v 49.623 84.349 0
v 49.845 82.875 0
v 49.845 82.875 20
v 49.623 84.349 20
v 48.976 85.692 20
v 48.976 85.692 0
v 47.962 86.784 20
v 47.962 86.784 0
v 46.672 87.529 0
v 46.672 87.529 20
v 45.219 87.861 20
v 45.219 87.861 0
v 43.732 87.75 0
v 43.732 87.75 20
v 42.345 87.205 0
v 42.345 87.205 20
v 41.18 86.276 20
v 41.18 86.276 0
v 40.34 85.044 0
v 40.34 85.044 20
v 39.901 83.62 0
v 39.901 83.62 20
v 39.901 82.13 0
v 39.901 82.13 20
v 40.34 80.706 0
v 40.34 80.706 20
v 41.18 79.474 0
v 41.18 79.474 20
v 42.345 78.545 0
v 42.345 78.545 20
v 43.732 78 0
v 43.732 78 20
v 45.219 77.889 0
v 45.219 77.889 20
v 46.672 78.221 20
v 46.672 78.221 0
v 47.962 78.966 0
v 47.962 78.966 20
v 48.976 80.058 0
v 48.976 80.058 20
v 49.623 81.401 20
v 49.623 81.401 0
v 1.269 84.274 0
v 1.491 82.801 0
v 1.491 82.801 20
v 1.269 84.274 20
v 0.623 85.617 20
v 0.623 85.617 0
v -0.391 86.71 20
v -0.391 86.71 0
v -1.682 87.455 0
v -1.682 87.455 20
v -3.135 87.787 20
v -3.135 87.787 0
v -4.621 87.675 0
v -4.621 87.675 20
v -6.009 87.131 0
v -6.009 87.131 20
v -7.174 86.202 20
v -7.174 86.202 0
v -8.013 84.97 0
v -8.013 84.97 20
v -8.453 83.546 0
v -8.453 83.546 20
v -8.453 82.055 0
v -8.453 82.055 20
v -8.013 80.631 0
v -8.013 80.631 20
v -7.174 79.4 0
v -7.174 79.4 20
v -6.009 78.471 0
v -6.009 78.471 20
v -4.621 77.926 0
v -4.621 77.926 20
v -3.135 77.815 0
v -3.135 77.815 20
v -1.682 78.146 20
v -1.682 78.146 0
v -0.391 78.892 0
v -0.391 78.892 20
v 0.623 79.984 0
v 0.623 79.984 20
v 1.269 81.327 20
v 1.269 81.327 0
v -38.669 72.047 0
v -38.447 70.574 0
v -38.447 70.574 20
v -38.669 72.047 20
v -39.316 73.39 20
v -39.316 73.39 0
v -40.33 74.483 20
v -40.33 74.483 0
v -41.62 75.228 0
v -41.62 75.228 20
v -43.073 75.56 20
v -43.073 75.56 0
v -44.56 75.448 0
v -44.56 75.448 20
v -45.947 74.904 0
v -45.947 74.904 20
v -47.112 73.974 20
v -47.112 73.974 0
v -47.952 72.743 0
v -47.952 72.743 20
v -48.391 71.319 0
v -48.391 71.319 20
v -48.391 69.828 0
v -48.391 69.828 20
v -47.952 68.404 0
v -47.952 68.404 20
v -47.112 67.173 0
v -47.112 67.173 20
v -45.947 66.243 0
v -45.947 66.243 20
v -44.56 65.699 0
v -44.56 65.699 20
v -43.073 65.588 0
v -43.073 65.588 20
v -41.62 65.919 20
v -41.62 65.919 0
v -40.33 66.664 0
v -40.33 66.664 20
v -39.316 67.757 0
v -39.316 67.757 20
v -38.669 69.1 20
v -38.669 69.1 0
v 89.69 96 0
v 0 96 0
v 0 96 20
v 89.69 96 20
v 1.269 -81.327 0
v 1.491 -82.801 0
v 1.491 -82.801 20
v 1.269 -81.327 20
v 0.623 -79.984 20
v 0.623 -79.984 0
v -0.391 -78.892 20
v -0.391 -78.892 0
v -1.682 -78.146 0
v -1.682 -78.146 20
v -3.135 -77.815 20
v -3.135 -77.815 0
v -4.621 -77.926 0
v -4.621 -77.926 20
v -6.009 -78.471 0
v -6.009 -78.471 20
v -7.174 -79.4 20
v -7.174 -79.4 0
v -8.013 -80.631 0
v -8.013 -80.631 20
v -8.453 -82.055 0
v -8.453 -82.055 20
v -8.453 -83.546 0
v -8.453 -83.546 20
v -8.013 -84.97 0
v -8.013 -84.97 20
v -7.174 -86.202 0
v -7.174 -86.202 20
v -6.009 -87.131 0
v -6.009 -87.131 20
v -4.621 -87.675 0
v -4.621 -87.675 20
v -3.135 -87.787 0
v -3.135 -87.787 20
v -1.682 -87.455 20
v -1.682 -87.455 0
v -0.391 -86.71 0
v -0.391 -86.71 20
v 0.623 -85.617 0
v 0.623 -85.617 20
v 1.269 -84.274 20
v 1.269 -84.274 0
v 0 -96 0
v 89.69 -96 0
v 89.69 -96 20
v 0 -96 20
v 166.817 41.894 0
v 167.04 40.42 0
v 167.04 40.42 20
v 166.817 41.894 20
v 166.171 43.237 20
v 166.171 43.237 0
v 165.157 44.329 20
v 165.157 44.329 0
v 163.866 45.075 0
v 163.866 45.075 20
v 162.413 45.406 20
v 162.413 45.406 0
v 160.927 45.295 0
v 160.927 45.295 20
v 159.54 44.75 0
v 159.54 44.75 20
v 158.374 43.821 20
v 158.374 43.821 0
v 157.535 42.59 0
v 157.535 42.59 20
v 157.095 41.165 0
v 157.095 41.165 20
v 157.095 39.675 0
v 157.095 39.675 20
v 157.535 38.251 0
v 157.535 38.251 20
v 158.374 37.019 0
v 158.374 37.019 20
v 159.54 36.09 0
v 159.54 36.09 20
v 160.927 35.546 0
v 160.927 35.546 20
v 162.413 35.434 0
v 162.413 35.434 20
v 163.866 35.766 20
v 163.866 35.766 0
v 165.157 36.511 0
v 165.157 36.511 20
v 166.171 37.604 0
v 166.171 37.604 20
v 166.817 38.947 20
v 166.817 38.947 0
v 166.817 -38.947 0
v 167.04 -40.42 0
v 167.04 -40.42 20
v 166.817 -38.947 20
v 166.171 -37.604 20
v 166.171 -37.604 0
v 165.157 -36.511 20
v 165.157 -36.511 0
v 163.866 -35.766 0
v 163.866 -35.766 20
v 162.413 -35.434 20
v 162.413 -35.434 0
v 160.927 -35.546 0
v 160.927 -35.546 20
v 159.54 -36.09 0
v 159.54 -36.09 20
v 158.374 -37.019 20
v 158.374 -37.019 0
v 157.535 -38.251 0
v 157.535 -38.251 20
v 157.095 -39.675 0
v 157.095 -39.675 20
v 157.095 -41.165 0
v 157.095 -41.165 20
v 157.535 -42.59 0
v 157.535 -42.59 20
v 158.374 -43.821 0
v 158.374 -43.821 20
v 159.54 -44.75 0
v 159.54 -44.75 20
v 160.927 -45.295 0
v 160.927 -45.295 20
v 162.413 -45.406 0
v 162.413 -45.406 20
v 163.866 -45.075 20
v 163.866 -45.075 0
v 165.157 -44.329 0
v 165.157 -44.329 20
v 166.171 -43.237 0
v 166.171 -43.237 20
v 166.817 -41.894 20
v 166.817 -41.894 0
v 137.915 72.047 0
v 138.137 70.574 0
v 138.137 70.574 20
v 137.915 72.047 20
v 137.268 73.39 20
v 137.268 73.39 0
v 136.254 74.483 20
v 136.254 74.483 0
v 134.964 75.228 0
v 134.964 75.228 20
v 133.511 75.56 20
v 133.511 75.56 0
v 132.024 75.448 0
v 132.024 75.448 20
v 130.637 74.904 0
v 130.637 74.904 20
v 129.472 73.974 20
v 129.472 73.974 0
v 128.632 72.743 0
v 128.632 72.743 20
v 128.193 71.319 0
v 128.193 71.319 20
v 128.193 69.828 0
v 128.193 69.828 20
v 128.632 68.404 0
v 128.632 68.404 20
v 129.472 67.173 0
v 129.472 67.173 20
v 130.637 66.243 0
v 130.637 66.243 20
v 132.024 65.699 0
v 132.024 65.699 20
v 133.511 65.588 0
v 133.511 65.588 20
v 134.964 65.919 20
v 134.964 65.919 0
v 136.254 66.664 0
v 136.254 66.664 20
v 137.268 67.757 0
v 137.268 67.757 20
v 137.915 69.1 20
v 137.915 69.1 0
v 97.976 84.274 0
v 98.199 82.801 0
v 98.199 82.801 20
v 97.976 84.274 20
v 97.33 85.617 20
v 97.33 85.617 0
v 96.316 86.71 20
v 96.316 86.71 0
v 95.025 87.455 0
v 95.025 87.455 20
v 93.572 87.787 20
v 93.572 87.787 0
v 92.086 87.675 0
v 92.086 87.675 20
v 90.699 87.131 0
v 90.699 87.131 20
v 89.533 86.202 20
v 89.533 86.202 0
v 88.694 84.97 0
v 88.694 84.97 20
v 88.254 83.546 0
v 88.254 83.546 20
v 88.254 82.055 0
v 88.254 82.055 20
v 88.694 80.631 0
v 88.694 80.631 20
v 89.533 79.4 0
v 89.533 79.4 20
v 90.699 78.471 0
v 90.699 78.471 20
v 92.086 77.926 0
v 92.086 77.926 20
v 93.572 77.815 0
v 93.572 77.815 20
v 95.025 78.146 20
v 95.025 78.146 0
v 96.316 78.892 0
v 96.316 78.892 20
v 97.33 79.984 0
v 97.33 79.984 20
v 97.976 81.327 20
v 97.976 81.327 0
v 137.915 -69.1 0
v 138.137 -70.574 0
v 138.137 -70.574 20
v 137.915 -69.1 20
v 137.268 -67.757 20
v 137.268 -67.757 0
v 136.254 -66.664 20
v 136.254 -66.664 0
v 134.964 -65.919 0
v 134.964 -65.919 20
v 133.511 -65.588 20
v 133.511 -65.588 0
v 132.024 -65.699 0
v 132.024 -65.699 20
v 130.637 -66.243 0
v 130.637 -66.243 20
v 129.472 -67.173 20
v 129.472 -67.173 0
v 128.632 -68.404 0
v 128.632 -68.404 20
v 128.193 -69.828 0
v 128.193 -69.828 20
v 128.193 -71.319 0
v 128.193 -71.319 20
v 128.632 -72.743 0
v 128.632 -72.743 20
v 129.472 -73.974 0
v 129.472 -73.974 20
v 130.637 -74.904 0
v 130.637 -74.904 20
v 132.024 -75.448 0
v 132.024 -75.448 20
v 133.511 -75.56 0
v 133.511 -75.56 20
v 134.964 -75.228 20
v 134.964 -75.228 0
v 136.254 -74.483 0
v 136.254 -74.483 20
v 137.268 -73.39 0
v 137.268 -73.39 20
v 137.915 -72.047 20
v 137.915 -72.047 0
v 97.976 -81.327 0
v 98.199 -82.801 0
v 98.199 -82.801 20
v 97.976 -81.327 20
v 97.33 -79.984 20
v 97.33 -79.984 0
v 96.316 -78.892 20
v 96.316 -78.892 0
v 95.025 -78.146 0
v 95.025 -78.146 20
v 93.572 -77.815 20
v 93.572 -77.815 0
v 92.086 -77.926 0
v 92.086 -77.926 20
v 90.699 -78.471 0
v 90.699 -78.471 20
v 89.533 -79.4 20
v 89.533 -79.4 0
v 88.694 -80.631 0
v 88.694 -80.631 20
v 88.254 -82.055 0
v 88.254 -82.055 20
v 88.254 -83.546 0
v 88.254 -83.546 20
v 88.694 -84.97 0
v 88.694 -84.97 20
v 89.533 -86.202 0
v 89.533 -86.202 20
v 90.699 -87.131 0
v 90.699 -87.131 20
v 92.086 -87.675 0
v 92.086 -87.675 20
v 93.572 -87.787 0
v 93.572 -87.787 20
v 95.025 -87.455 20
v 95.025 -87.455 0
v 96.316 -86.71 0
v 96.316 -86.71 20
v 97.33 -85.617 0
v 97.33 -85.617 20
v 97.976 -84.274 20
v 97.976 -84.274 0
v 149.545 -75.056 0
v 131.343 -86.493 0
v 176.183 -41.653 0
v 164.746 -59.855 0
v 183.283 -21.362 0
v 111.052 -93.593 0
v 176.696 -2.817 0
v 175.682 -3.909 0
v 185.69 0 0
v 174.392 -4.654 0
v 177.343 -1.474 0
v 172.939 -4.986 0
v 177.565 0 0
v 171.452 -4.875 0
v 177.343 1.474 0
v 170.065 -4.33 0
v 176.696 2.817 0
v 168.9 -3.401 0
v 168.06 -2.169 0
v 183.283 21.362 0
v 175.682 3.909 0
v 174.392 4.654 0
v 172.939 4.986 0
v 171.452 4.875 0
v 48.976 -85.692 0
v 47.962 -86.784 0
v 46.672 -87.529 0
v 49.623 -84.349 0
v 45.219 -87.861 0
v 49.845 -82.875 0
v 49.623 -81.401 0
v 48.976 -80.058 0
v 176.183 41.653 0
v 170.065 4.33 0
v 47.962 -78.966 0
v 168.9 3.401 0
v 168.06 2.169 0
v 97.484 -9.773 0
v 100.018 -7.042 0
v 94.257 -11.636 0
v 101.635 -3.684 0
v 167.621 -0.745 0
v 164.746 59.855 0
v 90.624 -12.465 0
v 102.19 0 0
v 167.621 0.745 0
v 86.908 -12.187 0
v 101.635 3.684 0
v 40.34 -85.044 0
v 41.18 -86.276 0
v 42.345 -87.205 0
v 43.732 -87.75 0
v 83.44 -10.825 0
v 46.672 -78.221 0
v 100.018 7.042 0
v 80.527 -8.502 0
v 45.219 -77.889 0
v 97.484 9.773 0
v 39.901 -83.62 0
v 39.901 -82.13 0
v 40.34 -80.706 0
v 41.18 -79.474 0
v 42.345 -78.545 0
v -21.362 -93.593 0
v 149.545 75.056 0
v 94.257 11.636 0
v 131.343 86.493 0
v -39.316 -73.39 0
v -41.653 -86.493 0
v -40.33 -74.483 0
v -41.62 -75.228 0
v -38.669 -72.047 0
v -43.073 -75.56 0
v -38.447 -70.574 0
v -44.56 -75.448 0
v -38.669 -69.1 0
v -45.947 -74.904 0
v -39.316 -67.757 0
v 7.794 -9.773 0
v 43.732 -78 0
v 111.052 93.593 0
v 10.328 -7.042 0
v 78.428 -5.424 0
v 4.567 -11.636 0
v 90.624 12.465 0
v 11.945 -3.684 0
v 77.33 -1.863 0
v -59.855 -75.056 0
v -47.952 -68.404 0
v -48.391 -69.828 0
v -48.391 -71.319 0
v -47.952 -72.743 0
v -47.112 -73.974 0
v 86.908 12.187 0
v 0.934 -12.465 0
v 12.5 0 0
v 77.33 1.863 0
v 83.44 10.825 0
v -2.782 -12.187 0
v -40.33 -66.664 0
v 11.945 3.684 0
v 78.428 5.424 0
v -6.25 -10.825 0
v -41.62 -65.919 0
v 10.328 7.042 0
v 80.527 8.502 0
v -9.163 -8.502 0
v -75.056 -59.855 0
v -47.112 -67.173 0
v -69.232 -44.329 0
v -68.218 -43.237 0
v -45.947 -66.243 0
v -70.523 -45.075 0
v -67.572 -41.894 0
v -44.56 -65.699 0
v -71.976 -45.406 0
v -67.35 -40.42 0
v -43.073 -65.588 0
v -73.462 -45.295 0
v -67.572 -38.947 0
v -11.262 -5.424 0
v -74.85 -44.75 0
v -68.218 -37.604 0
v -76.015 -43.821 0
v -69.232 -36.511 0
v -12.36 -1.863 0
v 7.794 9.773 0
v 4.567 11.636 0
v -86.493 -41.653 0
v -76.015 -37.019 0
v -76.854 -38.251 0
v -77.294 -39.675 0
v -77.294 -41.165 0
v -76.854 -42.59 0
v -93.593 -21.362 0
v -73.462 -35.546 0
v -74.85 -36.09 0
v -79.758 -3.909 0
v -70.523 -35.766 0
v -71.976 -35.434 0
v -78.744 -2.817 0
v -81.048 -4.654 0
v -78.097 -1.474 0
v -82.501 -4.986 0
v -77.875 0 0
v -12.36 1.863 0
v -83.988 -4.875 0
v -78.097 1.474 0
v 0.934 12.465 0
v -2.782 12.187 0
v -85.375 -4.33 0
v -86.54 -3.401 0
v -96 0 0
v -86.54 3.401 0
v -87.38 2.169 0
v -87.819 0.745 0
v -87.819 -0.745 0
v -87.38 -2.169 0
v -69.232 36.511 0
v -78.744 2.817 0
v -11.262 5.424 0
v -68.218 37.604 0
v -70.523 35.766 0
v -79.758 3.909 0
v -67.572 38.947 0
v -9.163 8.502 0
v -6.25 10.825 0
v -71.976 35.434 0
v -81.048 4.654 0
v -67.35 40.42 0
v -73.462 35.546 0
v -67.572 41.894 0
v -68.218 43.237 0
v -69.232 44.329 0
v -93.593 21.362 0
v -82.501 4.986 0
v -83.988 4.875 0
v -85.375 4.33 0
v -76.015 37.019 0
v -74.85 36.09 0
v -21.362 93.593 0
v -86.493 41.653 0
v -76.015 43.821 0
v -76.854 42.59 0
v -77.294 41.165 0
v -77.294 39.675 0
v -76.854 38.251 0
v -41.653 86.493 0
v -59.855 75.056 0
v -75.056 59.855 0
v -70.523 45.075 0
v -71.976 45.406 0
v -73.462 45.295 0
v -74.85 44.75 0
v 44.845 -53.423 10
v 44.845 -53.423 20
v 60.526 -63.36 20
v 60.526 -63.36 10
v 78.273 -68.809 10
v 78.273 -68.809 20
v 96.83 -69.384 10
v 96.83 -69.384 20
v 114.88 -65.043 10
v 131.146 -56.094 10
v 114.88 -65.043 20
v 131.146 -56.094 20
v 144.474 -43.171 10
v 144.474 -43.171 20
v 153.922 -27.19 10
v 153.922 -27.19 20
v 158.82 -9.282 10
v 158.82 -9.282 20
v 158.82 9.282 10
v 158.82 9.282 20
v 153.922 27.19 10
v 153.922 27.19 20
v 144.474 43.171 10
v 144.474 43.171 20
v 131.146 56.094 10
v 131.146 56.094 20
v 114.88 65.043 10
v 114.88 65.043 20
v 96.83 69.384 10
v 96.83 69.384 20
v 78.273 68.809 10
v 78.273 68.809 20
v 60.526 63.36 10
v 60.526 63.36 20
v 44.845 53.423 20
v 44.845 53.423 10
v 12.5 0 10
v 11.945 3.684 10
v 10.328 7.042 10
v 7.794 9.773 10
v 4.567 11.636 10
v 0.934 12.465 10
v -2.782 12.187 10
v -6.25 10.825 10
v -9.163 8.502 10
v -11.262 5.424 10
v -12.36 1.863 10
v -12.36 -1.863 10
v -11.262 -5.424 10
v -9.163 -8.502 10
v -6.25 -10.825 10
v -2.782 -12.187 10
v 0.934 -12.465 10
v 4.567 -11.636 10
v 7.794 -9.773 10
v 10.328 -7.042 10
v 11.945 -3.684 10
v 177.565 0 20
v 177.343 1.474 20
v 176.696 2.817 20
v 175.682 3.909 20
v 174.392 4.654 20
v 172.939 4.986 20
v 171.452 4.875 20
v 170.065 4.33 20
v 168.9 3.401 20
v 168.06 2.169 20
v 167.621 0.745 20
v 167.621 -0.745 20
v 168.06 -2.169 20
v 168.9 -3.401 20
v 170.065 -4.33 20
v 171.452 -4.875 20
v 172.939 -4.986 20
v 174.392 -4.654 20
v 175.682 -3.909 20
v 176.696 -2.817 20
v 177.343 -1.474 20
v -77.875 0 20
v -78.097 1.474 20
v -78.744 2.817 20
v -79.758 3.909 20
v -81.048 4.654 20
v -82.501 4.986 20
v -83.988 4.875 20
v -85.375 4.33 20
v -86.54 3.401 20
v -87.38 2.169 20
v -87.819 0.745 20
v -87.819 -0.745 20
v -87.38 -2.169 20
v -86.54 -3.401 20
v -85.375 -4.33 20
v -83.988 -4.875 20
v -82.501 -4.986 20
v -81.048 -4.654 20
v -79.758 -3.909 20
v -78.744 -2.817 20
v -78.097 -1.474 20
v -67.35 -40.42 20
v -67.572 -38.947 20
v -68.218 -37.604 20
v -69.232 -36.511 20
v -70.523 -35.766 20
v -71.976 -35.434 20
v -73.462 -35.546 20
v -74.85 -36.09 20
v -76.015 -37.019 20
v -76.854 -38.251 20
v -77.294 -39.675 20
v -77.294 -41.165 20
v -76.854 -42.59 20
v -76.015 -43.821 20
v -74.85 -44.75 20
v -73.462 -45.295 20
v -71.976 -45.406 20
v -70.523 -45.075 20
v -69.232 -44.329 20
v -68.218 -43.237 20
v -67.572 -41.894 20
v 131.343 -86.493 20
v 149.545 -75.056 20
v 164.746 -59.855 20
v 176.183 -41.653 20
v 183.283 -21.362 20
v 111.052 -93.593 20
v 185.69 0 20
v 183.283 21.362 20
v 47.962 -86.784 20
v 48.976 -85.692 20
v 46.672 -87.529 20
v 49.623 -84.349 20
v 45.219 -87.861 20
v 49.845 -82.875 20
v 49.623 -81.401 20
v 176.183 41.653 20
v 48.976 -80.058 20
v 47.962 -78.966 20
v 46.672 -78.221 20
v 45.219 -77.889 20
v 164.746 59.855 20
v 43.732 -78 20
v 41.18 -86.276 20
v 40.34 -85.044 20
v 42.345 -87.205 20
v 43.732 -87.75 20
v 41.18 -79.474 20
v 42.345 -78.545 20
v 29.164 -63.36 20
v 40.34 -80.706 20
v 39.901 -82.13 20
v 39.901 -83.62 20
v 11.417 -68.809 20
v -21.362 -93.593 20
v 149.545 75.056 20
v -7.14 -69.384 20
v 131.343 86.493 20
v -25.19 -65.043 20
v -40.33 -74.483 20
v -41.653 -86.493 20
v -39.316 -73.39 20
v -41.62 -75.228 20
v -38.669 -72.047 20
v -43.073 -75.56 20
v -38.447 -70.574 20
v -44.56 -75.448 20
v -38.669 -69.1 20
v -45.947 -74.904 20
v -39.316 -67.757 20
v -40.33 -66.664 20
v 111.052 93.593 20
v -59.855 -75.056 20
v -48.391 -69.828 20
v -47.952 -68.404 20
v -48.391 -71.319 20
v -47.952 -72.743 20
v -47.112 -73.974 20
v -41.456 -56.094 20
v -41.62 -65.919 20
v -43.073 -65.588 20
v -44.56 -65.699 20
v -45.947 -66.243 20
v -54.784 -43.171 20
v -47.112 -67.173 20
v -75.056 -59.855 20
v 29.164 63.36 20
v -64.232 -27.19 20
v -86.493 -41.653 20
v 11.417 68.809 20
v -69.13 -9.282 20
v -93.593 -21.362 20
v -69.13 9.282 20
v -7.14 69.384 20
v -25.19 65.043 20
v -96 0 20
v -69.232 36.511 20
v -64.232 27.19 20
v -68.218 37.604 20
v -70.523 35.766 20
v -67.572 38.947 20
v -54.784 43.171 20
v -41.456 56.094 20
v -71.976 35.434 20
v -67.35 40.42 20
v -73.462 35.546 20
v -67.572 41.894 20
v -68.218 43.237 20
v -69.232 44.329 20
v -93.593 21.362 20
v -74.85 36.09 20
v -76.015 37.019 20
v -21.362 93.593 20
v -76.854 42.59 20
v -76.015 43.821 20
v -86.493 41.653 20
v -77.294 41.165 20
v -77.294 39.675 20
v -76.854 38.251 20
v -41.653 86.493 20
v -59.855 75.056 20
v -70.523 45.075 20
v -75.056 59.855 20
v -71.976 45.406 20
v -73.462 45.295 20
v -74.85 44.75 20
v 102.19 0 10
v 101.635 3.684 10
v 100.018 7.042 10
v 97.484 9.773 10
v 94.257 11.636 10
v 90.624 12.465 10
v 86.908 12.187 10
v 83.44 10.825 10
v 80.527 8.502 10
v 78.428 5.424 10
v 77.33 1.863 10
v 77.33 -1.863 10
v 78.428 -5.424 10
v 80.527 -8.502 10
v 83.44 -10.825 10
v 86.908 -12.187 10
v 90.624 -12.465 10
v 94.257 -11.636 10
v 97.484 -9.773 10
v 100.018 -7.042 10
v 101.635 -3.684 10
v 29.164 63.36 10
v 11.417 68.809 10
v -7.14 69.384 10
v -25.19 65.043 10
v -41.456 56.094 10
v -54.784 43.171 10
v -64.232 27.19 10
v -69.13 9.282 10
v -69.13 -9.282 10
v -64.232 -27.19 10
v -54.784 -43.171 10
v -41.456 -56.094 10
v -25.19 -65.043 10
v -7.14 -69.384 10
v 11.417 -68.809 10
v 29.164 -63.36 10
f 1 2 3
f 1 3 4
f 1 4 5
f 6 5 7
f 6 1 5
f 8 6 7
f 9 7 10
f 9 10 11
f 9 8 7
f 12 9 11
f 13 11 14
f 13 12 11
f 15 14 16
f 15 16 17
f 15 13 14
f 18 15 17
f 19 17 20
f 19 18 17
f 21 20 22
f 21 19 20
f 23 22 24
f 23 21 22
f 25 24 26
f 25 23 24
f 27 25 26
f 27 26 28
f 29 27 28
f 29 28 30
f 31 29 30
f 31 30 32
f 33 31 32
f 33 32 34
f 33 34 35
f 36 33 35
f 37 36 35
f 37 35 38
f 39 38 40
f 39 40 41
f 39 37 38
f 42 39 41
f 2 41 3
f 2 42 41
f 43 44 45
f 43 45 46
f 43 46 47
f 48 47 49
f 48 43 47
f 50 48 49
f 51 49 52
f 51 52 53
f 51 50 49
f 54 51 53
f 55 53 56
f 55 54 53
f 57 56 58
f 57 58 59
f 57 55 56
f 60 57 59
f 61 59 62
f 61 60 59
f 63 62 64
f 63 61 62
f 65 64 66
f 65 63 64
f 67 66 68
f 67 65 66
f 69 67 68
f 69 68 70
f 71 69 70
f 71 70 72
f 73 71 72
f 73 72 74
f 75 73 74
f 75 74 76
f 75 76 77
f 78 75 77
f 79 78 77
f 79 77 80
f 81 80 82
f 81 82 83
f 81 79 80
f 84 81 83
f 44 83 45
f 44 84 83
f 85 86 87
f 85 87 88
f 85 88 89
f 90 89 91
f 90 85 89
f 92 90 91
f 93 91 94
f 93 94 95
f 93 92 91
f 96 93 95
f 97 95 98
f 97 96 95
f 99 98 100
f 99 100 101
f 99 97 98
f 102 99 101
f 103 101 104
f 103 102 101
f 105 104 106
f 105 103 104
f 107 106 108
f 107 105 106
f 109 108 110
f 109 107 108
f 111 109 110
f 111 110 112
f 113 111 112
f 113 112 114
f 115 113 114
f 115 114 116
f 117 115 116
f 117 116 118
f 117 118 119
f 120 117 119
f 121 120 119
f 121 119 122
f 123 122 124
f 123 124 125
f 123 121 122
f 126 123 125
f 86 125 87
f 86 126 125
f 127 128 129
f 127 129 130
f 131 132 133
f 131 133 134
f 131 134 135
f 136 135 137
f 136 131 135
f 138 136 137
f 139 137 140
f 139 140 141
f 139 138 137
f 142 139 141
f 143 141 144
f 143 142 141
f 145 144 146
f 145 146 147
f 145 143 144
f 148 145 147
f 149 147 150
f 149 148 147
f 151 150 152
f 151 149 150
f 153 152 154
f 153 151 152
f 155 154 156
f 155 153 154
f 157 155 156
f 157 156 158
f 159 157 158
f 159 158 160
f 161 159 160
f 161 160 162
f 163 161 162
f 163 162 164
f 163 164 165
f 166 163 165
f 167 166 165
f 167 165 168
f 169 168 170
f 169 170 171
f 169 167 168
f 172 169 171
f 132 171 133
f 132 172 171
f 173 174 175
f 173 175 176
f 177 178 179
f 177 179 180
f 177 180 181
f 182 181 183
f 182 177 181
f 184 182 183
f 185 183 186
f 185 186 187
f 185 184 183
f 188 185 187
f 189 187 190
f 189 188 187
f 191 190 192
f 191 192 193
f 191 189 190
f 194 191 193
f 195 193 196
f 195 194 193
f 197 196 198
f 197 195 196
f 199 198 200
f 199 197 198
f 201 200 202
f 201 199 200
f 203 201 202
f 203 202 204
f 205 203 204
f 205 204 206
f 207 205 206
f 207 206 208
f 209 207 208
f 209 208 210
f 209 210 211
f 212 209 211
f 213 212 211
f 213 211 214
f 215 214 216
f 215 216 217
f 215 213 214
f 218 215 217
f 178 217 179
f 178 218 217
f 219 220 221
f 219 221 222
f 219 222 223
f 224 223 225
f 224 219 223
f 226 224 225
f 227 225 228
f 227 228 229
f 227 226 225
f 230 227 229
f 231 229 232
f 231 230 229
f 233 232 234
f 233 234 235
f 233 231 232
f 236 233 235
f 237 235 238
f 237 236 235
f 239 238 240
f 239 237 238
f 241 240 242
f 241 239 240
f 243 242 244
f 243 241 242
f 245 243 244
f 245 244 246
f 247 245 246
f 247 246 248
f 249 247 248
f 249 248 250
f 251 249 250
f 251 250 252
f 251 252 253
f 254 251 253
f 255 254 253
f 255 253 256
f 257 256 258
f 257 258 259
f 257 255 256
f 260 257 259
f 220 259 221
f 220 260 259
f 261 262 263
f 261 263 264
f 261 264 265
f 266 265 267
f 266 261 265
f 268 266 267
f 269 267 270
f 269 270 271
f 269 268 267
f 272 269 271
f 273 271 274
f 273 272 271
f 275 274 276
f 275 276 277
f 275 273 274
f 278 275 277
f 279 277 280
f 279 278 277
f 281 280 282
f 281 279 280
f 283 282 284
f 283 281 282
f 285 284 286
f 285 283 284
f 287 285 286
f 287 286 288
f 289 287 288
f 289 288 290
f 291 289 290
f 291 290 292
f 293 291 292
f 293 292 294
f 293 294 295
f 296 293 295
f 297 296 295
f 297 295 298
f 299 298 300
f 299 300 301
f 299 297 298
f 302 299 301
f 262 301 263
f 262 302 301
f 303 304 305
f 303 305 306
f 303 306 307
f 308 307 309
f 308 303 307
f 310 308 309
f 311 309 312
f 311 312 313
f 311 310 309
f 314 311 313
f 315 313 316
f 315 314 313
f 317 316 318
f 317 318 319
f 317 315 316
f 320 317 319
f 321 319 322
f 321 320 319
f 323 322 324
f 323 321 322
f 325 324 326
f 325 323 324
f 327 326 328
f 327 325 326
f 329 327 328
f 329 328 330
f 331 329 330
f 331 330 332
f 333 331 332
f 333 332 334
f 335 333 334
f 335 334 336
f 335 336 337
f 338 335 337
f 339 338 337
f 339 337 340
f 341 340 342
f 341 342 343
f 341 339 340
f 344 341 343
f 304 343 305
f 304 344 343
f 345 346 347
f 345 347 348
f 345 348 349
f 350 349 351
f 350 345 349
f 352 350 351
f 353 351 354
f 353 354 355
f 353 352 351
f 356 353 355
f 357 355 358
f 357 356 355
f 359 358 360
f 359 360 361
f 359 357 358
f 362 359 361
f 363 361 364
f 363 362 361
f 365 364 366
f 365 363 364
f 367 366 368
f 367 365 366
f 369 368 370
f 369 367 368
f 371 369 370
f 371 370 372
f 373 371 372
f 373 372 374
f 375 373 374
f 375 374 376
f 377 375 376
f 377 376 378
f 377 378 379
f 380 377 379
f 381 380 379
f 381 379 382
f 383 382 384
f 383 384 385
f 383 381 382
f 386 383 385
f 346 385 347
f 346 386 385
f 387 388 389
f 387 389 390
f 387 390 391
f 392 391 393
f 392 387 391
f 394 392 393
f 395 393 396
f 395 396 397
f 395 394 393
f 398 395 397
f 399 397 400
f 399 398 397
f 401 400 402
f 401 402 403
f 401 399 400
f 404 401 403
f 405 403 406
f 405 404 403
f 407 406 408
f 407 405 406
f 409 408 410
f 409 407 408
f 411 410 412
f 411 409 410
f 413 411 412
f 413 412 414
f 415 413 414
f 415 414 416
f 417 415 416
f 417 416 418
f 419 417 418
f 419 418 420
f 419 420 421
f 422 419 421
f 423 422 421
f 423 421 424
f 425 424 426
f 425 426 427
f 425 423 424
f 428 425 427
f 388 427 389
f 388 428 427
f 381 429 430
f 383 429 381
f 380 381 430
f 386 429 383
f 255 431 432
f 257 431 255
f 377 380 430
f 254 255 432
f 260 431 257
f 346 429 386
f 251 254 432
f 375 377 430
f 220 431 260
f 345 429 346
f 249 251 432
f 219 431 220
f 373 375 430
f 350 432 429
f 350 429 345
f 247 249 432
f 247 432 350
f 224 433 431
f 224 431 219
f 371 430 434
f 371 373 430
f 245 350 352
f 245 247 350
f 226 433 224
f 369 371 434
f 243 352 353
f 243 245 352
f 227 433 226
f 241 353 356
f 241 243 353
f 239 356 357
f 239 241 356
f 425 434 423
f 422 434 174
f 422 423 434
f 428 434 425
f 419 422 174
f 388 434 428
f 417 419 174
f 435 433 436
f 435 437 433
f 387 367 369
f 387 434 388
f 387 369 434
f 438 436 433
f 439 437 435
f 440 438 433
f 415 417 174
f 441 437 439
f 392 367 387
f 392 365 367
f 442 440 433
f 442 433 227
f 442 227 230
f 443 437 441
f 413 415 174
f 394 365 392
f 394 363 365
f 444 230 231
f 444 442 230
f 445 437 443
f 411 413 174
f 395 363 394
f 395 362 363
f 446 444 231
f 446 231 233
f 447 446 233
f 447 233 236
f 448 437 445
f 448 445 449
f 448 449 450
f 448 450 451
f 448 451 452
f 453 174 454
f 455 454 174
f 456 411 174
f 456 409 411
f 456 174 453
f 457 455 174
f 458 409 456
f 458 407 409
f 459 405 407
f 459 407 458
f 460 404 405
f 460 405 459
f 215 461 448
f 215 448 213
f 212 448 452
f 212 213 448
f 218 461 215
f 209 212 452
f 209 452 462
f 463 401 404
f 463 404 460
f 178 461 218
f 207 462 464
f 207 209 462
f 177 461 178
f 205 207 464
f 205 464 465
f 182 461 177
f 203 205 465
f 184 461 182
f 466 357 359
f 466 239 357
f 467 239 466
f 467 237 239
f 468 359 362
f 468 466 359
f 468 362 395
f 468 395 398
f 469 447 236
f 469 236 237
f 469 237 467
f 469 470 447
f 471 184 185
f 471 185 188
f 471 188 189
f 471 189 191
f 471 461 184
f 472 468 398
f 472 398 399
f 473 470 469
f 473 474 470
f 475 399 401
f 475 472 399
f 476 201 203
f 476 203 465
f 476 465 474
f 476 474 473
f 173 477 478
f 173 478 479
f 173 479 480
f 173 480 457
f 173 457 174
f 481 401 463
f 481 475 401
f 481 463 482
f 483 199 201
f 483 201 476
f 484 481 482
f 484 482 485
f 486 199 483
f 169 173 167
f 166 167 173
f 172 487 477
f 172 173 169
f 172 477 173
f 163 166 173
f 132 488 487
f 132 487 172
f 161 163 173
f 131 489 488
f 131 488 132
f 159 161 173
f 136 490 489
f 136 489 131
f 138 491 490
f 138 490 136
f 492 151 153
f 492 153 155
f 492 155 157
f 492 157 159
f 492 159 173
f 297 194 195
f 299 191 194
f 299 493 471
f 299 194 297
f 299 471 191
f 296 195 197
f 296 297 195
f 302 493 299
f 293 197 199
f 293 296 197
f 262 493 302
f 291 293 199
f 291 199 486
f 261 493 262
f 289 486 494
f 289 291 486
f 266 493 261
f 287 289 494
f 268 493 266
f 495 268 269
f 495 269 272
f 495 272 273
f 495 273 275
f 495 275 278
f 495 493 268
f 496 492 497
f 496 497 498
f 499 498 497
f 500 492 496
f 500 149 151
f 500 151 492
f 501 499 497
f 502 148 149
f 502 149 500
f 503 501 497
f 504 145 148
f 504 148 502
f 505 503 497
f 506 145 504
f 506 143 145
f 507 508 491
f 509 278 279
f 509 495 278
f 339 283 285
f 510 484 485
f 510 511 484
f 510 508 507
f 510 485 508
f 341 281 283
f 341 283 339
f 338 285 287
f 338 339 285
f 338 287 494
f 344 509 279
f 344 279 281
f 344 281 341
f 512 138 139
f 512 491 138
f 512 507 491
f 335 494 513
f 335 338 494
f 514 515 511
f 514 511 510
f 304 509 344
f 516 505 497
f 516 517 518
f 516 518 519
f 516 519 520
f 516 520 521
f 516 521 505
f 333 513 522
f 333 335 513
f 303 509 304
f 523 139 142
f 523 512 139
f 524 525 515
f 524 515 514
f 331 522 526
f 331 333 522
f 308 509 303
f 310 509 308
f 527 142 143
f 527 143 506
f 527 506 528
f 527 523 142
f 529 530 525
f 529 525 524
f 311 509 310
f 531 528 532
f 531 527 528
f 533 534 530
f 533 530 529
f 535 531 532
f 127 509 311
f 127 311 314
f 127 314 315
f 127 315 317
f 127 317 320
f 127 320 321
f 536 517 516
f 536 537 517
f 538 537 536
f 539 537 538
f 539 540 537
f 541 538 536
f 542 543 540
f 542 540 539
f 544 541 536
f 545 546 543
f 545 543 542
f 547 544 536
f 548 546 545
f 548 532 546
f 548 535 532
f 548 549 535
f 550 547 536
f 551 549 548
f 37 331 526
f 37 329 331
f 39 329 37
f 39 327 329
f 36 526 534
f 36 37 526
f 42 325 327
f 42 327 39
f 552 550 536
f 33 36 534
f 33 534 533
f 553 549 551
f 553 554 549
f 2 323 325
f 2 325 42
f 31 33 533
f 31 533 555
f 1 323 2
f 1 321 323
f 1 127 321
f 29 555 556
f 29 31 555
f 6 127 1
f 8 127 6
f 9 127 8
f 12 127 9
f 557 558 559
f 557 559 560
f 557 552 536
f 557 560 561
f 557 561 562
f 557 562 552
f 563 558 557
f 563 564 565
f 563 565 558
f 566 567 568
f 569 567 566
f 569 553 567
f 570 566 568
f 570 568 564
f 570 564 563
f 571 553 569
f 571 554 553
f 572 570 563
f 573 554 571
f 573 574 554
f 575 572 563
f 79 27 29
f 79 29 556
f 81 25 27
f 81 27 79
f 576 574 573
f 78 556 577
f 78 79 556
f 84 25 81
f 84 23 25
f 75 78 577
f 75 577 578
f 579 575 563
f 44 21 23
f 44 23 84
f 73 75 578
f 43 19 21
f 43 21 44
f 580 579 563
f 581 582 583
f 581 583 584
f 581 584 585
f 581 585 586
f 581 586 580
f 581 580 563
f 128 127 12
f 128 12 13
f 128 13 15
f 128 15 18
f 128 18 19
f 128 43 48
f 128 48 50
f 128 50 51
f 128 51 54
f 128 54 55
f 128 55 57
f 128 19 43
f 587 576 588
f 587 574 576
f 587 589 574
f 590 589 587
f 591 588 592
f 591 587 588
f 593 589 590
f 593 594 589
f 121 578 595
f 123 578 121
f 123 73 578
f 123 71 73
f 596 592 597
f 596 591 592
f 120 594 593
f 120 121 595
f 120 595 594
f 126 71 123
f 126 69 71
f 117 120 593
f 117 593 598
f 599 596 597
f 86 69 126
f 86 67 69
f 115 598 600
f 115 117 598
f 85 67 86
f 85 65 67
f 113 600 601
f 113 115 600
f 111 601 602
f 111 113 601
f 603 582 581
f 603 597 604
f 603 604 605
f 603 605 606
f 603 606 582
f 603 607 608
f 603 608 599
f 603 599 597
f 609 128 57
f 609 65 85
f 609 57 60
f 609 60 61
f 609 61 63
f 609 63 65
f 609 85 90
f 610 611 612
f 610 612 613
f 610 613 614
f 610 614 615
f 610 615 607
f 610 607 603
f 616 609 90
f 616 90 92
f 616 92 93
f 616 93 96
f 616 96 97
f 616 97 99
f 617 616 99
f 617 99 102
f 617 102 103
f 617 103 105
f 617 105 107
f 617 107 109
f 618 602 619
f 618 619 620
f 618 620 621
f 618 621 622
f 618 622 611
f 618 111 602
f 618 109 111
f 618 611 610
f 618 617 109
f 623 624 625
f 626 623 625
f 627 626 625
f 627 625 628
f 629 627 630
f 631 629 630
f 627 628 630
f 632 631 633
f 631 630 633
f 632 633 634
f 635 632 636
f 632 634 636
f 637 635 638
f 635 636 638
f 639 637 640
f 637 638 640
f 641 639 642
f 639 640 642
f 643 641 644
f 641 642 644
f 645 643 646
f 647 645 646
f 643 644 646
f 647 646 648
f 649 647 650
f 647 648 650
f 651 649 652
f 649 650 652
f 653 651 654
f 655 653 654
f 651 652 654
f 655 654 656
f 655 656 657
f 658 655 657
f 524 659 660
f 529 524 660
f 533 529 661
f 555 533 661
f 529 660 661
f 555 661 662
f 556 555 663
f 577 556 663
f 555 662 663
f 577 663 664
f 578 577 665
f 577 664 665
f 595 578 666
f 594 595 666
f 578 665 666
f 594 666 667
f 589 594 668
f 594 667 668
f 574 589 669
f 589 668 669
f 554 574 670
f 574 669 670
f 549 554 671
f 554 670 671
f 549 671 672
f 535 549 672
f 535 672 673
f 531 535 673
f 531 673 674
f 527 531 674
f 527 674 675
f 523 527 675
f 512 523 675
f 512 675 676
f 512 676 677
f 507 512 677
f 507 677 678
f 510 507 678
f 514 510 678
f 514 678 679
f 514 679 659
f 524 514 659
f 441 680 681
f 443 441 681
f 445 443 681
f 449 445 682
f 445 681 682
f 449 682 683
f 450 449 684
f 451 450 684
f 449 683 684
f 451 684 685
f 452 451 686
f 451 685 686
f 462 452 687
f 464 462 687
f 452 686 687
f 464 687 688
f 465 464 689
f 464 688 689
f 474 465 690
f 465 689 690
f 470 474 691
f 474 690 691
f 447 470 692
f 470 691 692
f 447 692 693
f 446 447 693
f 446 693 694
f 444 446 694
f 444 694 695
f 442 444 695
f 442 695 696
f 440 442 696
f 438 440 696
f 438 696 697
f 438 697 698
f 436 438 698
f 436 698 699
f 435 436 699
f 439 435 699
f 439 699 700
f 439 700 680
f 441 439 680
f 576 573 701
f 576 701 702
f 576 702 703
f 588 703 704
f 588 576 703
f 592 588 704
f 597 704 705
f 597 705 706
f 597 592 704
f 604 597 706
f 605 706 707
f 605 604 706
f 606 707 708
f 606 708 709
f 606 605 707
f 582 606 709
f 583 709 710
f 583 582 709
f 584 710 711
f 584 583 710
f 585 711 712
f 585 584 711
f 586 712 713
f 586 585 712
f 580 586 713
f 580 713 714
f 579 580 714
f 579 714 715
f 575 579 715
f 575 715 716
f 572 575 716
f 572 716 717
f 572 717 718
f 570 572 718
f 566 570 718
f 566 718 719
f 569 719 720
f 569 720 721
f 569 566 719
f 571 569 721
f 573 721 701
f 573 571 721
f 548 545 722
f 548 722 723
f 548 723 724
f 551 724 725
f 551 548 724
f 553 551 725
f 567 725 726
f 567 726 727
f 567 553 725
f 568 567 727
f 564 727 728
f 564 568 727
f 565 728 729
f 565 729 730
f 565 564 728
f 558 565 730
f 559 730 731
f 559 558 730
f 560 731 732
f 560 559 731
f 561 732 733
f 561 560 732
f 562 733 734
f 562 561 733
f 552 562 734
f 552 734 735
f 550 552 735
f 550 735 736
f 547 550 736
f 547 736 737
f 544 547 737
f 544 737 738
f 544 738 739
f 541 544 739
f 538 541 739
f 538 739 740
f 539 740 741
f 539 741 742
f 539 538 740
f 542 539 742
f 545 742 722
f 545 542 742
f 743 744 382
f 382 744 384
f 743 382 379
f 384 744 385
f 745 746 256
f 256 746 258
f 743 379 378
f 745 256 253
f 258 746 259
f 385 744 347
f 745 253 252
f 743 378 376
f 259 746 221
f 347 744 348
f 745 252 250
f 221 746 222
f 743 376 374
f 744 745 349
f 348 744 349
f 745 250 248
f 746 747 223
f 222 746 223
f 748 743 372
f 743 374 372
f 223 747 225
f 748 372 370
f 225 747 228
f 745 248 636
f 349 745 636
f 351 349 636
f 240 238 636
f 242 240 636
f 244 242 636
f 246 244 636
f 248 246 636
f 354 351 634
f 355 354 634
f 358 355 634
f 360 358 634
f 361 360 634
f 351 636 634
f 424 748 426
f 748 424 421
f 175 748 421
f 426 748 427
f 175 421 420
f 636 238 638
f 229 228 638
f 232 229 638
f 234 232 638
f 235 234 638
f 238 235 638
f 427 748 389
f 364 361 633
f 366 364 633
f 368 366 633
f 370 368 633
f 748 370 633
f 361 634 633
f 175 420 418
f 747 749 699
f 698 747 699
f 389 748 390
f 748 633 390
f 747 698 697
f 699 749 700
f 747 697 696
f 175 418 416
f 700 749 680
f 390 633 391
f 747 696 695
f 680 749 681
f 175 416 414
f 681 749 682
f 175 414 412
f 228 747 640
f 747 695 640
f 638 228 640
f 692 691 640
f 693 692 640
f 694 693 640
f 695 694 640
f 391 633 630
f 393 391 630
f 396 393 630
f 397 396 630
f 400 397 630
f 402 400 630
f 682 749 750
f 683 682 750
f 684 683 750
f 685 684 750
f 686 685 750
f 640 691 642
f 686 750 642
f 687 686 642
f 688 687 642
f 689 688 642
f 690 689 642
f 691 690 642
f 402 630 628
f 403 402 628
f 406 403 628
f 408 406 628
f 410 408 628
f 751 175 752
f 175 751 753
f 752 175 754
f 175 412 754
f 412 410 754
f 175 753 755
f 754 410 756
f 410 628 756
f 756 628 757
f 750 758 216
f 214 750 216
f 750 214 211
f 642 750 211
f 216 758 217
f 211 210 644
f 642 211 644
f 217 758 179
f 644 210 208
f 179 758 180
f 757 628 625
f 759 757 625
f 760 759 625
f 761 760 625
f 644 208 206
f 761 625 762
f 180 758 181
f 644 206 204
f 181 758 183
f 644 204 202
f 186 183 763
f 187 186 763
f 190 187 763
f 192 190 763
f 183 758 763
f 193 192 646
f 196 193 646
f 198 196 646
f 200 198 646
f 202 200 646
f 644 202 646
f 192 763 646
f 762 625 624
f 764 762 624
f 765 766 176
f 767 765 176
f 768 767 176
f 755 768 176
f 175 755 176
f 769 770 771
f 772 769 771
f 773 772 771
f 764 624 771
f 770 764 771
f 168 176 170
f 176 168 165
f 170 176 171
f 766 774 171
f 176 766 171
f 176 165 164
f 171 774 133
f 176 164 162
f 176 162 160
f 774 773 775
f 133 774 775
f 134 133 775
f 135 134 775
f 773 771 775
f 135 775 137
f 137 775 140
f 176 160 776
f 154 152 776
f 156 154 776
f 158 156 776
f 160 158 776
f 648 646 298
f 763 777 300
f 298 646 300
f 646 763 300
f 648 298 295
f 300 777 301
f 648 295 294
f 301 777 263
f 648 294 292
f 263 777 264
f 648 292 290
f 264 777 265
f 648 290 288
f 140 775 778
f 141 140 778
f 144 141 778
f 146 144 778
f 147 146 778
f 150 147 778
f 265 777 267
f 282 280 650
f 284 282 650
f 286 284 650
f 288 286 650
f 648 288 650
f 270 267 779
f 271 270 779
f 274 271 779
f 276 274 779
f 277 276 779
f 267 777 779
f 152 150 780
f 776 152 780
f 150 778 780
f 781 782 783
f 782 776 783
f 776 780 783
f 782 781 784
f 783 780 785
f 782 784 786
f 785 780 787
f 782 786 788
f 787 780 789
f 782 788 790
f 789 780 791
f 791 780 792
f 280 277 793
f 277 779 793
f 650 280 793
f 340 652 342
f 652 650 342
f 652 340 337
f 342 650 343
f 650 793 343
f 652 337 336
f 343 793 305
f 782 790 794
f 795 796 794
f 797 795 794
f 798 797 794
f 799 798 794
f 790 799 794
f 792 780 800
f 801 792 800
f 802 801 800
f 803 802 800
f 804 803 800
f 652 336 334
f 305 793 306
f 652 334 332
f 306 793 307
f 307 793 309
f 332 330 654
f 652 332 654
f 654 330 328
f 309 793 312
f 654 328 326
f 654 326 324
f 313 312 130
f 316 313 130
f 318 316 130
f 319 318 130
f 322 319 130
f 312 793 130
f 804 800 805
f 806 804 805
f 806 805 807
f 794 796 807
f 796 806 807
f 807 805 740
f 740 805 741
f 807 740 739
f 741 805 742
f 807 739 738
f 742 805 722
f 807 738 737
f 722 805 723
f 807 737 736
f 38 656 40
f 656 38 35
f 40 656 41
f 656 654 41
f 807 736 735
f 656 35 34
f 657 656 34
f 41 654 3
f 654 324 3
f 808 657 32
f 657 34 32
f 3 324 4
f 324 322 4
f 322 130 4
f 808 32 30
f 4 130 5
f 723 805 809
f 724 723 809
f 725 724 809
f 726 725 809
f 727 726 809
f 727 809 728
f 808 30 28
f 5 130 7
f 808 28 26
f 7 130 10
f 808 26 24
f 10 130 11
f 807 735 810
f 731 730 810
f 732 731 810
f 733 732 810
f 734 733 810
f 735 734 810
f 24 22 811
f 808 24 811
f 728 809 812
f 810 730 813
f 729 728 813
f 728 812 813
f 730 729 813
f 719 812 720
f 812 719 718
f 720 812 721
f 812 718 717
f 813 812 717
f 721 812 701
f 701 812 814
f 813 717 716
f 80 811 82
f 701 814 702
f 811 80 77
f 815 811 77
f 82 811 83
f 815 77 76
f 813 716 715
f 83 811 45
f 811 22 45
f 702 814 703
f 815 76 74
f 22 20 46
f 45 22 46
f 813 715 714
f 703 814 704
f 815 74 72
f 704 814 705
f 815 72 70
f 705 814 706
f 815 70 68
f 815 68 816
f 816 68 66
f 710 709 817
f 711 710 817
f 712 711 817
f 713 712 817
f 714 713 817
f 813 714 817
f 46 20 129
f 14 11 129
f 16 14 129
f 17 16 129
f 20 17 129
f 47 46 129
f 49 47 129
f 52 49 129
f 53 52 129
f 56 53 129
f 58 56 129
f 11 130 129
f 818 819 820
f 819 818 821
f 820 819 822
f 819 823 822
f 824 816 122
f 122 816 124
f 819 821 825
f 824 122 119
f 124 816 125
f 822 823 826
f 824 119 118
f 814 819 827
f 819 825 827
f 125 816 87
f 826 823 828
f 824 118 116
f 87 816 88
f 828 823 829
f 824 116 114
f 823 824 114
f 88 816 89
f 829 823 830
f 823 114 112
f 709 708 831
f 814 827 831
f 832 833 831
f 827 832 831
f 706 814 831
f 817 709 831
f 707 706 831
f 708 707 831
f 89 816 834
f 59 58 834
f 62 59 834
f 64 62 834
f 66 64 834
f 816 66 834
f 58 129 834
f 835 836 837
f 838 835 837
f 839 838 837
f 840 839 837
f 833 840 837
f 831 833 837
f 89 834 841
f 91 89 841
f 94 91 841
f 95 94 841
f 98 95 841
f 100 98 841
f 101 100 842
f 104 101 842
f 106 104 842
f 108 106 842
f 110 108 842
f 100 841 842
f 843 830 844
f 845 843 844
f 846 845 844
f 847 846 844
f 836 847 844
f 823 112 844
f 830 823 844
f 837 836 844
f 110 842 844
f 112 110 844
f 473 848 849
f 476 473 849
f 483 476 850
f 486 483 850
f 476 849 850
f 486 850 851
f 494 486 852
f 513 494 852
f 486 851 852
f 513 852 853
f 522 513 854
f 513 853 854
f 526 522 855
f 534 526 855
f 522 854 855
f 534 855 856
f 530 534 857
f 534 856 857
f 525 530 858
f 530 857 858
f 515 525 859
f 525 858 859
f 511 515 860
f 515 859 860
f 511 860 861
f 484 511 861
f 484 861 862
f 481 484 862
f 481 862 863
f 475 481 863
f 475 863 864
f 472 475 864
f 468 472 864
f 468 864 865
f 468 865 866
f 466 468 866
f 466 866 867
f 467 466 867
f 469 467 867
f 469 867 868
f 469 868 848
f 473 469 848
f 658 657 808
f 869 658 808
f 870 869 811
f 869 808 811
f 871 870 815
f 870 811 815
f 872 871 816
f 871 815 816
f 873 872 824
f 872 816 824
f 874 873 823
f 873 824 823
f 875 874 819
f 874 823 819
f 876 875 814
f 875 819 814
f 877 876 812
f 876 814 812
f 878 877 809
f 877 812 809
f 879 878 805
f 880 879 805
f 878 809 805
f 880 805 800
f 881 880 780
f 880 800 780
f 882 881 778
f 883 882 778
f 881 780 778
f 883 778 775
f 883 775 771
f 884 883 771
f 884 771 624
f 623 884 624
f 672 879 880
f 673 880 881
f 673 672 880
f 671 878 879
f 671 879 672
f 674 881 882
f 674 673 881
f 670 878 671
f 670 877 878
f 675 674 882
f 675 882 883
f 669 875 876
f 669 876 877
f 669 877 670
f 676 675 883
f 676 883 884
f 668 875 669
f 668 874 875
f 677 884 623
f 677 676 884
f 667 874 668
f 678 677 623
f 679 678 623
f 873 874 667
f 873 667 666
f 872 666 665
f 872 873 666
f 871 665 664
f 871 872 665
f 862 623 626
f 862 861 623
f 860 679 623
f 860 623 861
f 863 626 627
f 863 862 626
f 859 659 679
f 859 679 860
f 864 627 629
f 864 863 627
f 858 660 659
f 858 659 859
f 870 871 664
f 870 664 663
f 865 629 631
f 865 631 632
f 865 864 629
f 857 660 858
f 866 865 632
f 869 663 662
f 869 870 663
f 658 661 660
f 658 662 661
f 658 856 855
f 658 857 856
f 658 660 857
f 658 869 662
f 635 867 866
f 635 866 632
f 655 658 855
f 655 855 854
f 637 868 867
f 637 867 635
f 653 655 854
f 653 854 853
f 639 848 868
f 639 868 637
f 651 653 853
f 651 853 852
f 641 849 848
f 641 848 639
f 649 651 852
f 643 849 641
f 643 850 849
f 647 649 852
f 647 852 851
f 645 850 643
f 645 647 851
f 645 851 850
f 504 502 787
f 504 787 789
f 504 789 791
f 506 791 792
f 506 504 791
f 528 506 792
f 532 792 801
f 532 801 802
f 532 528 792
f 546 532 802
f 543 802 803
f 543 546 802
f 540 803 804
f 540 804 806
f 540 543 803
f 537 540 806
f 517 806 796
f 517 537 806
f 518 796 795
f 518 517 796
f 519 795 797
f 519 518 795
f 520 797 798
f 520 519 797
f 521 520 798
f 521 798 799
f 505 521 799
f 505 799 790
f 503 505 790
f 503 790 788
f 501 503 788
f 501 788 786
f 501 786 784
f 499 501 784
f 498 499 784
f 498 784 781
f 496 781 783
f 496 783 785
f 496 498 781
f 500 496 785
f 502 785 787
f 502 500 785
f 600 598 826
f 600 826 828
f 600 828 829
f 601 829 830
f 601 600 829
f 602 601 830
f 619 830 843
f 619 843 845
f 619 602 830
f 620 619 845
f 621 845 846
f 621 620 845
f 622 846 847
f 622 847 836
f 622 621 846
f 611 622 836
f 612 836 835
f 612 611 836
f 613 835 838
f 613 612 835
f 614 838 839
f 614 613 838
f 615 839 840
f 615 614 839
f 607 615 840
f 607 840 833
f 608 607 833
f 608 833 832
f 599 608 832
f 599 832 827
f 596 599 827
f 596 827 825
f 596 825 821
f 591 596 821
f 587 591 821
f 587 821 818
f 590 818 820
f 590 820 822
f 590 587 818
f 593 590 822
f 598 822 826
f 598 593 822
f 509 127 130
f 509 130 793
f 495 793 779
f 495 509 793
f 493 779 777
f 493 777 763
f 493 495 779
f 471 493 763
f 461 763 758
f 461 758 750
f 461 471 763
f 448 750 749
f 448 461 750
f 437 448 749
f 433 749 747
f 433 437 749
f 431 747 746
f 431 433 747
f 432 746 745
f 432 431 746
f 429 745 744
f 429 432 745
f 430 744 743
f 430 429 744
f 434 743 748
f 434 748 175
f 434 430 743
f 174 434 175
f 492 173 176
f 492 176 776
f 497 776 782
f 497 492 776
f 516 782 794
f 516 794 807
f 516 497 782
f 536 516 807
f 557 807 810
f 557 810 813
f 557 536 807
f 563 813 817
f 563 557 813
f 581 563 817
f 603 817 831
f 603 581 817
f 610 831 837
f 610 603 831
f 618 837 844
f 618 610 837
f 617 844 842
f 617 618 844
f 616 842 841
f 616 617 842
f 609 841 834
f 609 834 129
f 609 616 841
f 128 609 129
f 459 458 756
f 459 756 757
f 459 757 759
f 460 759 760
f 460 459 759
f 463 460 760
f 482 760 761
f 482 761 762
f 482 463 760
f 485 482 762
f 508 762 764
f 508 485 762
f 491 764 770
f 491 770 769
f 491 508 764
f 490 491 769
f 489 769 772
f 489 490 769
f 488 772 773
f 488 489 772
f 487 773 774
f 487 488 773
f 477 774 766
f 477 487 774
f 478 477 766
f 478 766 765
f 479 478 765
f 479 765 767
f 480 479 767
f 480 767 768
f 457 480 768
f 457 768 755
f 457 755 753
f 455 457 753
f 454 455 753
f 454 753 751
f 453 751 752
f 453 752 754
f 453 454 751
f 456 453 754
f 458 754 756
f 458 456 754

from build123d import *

# Parameters (mm, degrees)
BOSS_EXTRUDE1_DEPTH   = 20
SKETCH2_R             = 69.75
CUT_EXTRUDE1_DEPTH    = 10
SKETCH3_R             = 12.5
CUT_EXTRUDE2_DEPTH    = 210.276793028
SKETCH4_R             = 5
CUT_EXTRUDE3_DEPTH    = 210.992323907
CRVPATTERN2_OUTLINE_R = 5
CRVPATTERN2_DEPTH     = 20


# Read off the part's stored shape, not the designer's step: CrvPattern2
with BuildPart() as part:
    # Sketch1 → Boss-Extrude1 (new body)
    with BuildSketch(Plane.XY):
        with BuildLine():
            Line((0, 96), (89.69, 96))
            ThreePointArc((89.69, 96), (185.69, 0), (89.69, -96))
            Line((89.69, -96), (0, -96))
            ThreePointArc((0, -96), (-96, 0), (0, 96))
        make_face()
    extrude(amount=BOSS_EXTRUDE1_DEPTH)

    # Sketch2 → Cut-Extrude1 (cut)
    with BuildSketch(Plane.XY.offset(20)):
        with Locations((89.69, 0)):
            Circle(SKETCH2_R)
        Circle(SKETCH2_R)
    extrude(amount=-CUT_EXTRUDE1_DEPTH, mode=Mode.SUBTRACT)

    # Sketch3 → Cut-Extrude2 (cut, through all)
    with BuildSketch(Plane.XY.offset(10)):
        Circle(SKETCH3_R)
        with Locations((89.69, 0)):
            Circle(SKETCH3_R)
    extrude(amount=-CUT_EXTRUDE2_DEPTH, mode=Mode.SUBTRACT)

    # Sketch4 → Cut-Extrude3 (cut, through all)
    with BuildSketch(Plane.XY.offset(20)):
        with Locations((172.565, 0)):
            Circle(SKETCH4_R)
    extrude(amount=-CUT_EXTRUDE3_DEPTH, mode=Mode.SUBTRACT)

    # CrvPattern2 outline → CrvPattern2 (cut)
    with BuildSketch(Plane.XY):
        with Locations((162.039610622, 40.420285352)):
            Circle(CRVPATTERN2_OUTLINE_R)
        with Locations((162.039610622, -40.420285352)):
            Circle(CRVPATTERN2_OUTLINE_R)
        with Locations((133.136958542, -70.573560335)):
            Circle(CRVPATTERN2_OUTLINE_R)
        with Locations((93.198501794, -82.800700723)):
            Circle(CRVPATTERN2_OUTLINE_R)
        with Locations((44.845, -82.875)):
            Circle(CRVPATTERN2_OUTLINE_R)
        with Locations((-3.508501794, -82.800700723)):
            Circle(CRVPATTERN2_OUTLINE_R)
        with Locations((-43.446958542, -70.573560335)):
            Circle(CRVPATTERN2_OUTLINE_R)
        with Locations((-72.349610622, -40.420285352)):
            Circle(CRVPATTERN2_OUTLINE_R)
        with Locations((-82.875, 0)):
            Circle(CRVPATTERN2_OUTLINE_R)
        with Locations((-72.349610622, 40.420285352)):
            Circle(CRVPATTERN2_OUTLINE_R)
        with Locations((-43.446958542, 70.573560335)):
            Circle(CRVPATTERN2_OUTLINE_R)
        with Locations((-3.508501794, 82.800700723)):
            Circle(CRVPATTERN2_OUTLINE_R)
        with Locations((44.845, 82.875)):
            Circle(CRVPATTERN2_OUTLINE_R)
        with Locations((93.198501794, 82.800700723)):
            Circle(CRVPATTERN2_OUTLINE_R)
        with Locations((133.136958542, 70.573560335)):
            Circle(CRVPATTERN2_OUTLINE_R)
    extrude(amount=CRVPATTERN2_DEPTH, mode=Mode.SUBTRACT)


solid = part.part
